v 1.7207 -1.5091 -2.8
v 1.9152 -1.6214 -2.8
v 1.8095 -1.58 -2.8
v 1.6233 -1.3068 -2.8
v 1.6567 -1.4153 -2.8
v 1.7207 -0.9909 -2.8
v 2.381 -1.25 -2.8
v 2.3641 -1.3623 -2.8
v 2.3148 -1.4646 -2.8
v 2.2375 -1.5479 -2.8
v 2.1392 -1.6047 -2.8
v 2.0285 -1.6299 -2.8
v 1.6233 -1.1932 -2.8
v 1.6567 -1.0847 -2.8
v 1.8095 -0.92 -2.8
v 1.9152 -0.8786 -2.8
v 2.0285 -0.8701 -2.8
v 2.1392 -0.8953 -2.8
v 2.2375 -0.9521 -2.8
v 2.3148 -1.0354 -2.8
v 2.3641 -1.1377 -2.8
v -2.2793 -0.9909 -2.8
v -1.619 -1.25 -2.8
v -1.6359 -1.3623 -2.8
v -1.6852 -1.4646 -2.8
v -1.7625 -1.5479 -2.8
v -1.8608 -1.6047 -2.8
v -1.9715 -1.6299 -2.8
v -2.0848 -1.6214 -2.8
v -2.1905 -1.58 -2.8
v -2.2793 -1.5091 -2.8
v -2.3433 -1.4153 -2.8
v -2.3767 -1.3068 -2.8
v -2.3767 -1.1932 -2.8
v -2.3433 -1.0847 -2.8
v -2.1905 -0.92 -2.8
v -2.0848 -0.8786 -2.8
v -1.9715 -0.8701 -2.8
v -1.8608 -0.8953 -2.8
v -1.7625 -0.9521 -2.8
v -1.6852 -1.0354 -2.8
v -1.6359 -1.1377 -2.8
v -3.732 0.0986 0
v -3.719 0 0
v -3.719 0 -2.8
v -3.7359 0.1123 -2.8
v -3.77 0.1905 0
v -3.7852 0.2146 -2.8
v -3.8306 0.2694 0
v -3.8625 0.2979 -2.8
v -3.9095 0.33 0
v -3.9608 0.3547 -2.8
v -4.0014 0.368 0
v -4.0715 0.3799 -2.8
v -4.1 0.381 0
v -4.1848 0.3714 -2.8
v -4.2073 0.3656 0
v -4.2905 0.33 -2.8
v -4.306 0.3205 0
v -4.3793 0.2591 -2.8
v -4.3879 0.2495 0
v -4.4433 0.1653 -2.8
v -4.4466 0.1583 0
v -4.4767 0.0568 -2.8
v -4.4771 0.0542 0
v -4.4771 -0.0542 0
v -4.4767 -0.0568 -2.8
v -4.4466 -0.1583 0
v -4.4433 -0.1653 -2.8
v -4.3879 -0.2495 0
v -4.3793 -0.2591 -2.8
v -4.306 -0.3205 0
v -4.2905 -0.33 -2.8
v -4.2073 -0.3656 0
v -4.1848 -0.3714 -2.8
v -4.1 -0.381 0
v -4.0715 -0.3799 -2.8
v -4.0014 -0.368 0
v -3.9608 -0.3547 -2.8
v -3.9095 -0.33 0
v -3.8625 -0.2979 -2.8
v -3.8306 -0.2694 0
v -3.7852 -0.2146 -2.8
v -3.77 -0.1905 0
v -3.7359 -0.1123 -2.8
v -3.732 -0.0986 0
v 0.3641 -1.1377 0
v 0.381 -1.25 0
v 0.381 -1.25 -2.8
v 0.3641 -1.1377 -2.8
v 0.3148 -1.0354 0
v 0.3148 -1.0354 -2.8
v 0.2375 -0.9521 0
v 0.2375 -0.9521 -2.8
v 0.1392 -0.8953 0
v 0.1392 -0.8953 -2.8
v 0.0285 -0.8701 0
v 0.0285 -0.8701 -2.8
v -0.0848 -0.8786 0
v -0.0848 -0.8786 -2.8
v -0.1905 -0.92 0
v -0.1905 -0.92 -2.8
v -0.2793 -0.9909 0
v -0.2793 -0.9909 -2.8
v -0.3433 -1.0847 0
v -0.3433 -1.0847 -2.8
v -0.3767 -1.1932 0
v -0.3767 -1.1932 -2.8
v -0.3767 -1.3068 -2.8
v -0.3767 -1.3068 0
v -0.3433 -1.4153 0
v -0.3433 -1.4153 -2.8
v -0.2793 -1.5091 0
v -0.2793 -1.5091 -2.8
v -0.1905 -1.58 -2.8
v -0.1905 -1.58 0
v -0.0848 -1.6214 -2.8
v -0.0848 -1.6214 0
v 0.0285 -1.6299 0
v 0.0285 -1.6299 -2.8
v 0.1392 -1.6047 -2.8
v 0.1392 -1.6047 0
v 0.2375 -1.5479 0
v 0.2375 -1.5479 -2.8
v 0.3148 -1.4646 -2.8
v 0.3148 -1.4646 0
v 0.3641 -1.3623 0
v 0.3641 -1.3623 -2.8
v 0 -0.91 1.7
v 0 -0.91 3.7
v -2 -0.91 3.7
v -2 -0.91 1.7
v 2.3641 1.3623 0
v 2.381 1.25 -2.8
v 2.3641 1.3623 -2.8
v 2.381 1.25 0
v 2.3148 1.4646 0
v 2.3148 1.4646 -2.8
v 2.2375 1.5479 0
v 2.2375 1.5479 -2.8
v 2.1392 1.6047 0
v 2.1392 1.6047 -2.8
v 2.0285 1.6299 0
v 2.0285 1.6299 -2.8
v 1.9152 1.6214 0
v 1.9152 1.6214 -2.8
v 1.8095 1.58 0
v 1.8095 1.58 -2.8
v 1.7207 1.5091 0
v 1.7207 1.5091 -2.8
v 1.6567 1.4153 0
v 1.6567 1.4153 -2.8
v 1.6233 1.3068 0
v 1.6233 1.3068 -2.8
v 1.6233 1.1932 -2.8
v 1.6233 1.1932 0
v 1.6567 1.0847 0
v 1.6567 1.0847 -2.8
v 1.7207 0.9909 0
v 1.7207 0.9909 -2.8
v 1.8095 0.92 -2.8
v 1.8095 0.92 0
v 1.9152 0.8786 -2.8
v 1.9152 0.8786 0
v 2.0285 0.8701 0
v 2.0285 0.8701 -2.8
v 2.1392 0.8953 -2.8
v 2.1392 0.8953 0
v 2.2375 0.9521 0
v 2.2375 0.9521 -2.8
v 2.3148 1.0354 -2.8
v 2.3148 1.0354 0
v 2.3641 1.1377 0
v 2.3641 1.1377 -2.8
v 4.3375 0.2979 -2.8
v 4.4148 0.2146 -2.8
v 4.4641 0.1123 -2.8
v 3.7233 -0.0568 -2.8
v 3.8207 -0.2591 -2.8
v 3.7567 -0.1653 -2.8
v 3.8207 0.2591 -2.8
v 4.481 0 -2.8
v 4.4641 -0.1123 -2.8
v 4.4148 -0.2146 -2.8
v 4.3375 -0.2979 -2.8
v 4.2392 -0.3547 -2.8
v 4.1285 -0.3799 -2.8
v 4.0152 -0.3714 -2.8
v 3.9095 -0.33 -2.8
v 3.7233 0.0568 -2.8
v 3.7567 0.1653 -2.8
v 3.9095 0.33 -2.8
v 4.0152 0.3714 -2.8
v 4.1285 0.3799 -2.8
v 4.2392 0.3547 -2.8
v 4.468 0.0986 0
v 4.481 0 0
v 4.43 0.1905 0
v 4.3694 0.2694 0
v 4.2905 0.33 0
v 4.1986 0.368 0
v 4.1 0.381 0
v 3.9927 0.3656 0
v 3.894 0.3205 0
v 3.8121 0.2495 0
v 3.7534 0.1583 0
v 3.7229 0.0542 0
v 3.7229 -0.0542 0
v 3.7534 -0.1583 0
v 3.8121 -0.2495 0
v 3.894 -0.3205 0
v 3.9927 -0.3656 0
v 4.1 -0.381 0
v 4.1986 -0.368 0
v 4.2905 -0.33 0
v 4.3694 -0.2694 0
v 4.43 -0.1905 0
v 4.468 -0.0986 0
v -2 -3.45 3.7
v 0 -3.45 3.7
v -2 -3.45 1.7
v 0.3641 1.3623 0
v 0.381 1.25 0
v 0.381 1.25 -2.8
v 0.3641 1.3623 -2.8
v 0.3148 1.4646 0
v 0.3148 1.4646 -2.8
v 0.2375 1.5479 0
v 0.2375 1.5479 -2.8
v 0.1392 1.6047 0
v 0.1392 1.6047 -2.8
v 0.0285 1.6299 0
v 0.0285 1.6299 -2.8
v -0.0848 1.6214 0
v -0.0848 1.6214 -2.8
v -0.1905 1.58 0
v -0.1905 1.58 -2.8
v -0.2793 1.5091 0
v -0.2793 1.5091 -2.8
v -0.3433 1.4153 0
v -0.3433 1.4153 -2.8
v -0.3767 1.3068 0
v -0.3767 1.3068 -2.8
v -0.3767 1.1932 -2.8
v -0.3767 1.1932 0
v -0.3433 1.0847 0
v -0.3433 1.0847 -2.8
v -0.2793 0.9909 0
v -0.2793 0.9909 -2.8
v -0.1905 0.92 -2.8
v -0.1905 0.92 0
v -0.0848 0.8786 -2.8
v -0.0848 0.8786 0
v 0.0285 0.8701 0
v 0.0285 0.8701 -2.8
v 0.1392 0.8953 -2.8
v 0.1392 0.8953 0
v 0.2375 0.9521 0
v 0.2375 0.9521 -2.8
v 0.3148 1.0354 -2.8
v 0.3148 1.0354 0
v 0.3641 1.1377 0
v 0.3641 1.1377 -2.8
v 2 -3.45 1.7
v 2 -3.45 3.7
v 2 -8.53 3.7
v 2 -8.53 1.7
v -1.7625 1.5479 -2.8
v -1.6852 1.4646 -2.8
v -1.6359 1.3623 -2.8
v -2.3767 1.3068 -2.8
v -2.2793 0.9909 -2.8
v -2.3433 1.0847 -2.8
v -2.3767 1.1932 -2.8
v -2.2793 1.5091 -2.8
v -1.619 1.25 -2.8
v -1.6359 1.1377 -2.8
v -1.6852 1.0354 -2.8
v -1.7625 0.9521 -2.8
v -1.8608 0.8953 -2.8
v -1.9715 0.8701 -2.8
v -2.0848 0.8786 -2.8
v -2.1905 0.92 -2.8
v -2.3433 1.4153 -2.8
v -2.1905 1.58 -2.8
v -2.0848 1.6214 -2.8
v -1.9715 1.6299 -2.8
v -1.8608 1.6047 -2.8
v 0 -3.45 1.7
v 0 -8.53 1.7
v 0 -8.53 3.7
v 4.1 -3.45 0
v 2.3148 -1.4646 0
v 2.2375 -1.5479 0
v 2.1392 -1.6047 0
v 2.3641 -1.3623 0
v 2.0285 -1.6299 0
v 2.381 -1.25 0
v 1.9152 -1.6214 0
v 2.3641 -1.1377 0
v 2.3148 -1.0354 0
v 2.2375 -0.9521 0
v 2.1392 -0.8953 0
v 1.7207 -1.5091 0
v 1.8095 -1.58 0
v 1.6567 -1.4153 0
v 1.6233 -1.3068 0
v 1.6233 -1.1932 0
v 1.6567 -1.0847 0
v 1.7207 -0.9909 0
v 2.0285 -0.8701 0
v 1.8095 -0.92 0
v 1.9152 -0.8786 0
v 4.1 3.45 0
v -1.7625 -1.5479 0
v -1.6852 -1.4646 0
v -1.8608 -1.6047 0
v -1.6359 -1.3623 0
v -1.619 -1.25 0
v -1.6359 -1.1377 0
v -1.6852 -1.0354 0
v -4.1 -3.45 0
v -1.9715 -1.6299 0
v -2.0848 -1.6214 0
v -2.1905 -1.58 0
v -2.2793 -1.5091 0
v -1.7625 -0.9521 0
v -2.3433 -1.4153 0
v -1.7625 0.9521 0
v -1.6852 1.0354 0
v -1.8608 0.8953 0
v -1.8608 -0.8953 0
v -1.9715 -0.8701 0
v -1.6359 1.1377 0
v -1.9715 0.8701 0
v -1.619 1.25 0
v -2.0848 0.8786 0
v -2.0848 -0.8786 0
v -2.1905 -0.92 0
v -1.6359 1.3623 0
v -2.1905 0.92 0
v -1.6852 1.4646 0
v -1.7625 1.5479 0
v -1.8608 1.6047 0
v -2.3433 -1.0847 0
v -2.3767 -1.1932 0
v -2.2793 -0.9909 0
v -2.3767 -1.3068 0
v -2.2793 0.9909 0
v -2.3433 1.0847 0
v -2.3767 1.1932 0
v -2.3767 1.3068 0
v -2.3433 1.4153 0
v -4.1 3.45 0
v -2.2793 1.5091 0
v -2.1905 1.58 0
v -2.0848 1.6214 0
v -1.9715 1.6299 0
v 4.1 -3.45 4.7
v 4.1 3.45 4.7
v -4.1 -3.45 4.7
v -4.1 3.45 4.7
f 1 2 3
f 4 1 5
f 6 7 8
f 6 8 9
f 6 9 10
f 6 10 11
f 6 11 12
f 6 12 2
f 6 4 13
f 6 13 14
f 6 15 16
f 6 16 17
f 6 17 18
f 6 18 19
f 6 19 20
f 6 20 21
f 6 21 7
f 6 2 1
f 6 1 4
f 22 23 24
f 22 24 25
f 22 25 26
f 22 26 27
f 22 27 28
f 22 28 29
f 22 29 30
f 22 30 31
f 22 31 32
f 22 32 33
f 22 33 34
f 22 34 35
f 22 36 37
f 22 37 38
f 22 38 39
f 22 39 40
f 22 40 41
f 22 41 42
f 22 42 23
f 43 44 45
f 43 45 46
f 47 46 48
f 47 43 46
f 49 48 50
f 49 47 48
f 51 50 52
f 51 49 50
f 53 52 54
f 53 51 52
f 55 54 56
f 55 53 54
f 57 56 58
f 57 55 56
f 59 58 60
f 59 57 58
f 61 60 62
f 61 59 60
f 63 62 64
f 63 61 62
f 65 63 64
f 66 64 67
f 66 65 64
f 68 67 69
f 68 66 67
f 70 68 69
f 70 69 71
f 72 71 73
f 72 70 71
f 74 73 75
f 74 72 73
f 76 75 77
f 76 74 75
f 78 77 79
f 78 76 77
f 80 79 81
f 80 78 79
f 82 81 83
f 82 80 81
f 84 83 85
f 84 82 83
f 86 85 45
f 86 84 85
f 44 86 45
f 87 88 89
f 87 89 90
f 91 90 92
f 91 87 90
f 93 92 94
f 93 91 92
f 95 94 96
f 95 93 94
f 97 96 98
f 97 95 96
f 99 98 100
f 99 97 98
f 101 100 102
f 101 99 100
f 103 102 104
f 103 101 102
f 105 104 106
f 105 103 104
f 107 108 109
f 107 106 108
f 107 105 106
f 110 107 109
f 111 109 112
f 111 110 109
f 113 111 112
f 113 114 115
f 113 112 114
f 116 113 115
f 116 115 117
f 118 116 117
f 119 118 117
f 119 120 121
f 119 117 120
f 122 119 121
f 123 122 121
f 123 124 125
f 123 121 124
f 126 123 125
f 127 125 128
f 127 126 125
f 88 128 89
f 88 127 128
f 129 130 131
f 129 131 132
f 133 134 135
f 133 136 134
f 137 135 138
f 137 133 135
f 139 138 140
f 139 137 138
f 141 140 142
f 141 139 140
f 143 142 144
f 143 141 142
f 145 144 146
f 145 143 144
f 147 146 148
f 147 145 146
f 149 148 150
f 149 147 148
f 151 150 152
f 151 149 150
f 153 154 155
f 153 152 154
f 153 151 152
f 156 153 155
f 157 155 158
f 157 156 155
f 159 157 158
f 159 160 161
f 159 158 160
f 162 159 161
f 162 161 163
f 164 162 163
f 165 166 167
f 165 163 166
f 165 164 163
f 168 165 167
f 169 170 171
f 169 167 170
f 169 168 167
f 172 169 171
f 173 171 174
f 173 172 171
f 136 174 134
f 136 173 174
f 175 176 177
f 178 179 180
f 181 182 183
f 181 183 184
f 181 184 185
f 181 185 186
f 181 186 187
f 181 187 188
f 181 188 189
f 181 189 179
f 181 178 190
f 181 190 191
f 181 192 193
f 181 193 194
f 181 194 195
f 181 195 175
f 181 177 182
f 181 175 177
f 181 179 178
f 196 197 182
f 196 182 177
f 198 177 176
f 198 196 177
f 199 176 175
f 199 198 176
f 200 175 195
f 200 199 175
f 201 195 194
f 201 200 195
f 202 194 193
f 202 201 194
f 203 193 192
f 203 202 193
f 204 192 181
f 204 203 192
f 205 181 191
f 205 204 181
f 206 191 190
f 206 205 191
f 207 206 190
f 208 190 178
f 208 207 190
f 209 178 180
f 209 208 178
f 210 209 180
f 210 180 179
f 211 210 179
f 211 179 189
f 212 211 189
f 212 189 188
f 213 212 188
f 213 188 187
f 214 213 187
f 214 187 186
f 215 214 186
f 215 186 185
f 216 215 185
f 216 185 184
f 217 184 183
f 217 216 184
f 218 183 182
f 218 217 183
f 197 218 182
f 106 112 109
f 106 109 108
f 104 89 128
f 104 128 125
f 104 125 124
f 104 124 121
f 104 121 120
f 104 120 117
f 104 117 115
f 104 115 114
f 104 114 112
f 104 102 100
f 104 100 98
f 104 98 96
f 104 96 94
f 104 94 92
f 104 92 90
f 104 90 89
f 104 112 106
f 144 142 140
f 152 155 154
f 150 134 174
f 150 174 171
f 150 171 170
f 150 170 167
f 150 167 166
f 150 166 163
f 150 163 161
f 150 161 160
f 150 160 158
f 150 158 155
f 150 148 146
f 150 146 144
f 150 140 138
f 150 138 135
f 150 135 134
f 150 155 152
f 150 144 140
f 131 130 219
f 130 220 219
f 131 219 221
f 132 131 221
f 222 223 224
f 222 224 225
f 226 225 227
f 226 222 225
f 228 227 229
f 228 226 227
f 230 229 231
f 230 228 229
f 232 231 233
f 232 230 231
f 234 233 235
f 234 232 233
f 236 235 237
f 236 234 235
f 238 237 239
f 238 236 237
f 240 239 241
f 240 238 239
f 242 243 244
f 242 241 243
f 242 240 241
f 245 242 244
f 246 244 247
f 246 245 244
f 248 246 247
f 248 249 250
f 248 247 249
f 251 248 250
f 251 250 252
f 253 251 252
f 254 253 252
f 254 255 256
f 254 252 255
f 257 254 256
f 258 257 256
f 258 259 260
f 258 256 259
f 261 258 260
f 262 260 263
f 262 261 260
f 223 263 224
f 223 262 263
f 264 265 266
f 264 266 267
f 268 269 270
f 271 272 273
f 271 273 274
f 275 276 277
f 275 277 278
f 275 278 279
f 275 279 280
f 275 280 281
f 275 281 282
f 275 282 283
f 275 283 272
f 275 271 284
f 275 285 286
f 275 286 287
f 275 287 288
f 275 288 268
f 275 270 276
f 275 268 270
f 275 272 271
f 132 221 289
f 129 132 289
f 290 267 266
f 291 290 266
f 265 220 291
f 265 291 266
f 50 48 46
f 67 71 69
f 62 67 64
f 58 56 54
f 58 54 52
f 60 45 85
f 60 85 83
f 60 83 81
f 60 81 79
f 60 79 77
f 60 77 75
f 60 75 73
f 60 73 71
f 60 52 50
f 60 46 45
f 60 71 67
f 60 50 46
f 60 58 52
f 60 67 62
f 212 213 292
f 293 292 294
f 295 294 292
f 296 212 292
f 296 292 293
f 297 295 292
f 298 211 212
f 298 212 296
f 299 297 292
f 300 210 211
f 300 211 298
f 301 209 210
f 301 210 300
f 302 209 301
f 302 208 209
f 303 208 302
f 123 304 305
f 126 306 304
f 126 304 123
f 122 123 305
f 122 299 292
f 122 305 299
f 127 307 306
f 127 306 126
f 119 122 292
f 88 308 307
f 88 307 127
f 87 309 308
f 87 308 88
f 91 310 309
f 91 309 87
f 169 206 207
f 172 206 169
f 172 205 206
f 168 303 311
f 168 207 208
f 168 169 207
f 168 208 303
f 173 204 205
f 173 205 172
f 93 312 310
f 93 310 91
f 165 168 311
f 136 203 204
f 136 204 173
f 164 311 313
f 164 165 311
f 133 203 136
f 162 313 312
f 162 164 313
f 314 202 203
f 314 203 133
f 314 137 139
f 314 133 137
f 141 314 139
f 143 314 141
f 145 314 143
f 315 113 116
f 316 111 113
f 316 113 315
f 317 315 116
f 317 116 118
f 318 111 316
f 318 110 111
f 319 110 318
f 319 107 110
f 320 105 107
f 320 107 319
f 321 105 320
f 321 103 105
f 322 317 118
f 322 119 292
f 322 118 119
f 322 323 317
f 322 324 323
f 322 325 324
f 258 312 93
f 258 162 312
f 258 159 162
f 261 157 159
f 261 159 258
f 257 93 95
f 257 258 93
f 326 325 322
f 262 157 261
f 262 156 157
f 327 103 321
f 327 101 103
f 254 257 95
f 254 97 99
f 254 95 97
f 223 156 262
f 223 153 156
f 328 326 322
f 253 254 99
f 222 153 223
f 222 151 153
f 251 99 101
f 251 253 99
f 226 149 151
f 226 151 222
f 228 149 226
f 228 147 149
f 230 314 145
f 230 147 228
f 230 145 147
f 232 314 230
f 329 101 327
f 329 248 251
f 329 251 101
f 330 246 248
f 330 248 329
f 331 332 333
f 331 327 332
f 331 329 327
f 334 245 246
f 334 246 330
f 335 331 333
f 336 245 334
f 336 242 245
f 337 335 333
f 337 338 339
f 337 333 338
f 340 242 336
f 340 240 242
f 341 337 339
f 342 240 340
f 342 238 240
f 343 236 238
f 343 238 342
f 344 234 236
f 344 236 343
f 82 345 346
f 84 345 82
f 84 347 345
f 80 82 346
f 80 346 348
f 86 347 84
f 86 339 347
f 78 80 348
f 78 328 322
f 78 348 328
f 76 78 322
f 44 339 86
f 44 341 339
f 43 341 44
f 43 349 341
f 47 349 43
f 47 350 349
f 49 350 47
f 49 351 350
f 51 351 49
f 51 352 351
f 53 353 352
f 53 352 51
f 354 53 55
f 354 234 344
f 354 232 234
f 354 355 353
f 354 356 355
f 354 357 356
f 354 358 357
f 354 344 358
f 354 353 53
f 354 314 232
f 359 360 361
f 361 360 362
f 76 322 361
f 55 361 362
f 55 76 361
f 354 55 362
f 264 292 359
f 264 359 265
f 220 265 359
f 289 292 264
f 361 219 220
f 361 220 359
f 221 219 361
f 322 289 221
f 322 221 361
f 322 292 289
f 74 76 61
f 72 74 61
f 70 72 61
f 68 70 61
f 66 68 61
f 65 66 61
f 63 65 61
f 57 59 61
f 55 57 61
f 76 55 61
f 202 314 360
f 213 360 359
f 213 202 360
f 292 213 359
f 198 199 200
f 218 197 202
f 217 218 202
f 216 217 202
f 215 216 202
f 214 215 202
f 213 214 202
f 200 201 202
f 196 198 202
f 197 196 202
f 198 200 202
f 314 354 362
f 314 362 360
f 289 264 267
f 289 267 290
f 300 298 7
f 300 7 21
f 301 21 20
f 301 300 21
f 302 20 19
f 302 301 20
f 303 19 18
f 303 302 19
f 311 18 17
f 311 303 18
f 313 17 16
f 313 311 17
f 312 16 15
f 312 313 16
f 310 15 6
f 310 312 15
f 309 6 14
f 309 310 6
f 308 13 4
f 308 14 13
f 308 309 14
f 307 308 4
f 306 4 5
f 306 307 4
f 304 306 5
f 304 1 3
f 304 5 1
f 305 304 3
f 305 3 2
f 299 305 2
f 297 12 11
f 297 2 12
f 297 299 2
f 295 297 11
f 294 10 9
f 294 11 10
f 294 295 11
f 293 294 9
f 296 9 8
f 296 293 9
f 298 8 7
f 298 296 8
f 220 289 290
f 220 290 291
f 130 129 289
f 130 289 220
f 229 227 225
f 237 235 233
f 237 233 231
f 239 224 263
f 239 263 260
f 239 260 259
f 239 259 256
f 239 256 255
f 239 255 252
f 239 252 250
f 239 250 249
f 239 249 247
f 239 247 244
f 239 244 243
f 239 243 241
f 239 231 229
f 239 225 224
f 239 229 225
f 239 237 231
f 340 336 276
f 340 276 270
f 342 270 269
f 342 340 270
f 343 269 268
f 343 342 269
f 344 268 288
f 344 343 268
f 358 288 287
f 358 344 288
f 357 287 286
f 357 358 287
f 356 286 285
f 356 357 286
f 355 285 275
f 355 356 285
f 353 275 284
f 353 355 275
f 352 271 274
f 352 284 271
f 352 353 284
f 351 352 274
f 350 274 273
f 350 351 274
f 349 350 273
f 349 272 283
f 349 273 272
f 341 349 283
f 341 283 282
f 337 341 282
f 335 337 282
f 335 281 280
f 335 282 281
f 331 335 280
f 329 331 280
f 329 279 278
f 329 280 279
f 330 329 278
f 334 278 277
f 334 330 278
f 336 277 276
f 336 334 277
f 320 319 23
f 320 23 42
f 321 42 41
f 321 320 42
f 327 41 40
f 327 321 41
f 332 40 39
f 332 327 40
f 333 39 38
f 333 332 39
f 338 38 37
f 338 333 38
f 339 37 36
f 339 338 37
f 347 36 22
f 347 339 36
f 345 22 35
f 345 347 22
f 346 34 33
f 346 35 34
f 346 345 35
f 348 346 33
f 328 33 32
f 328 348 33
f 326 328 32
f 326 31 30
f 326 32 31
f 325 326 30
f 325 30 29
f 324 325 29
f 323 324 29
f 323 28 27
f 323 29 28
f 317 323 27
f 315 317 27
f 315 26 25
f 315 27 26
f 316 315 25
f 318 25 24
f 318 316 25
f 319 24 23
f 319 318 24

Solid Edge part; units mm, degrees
sketch "Sketch1" plane through (0, 0, 0) normal (0, 0, 1) x (1, 0, 0)
  line L0 (4.1, -3.45) -> (-4.1, -3.45)
  line L1 (-4.1, -3.45) -> (-4.1, 3.45)
  line L2 (-4.1, 3.45) -> (4.1, 3.45)
  line L3 (4.1, 3.45) -> (4.1, -3.45)
extrude "Protrusion1" add sketch "Sketch1" along normal blind 4.7
sketch "Sketch2" plane through (0, 0, 0) normal (0, 0, -1) x (1, 0, 0)
  circle A0 centre (-2, 1.25) radius 0.381
  circle A1 centre (0, 1.25) radius 0.381
  circle A2 centre (2, 1.25) radius 0.381
  circle A3 centre (2, -1.25) radius 0.381
  circle A4 centre (0, -1.25) radius 0.381
  circle A5 centre (-2, -1.25) radius 0.381
  circle A6 centre (-4.1, 0) radius 0.381
  circle A7 centre (4.1, 0) radius 0.381
  dimension "D1" = 4
  dimension "D2" = 2.5
  dimension "D3" = 0.762
  dimension "D4" = 8.2
extrude "ExtrudedProtrusion_2" add sketch "Sketch2" along normal blind 2.8
sketch "Sketch3" plane through (0, -3.45, 4.5593) normal (0, -1, 0) x (1, 0, 0)
  line L0 (2, -2.8593) -> (0, -2.8593)
  line L1 (0, -2.8593) -> (0, -0.8593)
  line L2 (0, -0.8593) -> (2, -0.8593)
  line L3 (2, -0.8593) -> (2, -2.8593)
extrude "ExtrudedProtrusion_3" add sketch "Sketch3" along normal blind 5.08
sketch "Sketch4" plane through (0, -3.45, 4.5593) normal (0, -1, 0) x (1, 0, 0)
  line L0 (-2, -0.8593) -> (-2, -2.8593)
  line L1 (-2, -2.8593) -> (0, -2.8593)
  line L2 (0, -2.8593) -> (0, -0.8593)
  line L3 (0, -0.8593) -> (-2, -0.8593)
extrude "ExtrudedCutout_1" cut sketch "Sketch4" against normal blind 2.54
